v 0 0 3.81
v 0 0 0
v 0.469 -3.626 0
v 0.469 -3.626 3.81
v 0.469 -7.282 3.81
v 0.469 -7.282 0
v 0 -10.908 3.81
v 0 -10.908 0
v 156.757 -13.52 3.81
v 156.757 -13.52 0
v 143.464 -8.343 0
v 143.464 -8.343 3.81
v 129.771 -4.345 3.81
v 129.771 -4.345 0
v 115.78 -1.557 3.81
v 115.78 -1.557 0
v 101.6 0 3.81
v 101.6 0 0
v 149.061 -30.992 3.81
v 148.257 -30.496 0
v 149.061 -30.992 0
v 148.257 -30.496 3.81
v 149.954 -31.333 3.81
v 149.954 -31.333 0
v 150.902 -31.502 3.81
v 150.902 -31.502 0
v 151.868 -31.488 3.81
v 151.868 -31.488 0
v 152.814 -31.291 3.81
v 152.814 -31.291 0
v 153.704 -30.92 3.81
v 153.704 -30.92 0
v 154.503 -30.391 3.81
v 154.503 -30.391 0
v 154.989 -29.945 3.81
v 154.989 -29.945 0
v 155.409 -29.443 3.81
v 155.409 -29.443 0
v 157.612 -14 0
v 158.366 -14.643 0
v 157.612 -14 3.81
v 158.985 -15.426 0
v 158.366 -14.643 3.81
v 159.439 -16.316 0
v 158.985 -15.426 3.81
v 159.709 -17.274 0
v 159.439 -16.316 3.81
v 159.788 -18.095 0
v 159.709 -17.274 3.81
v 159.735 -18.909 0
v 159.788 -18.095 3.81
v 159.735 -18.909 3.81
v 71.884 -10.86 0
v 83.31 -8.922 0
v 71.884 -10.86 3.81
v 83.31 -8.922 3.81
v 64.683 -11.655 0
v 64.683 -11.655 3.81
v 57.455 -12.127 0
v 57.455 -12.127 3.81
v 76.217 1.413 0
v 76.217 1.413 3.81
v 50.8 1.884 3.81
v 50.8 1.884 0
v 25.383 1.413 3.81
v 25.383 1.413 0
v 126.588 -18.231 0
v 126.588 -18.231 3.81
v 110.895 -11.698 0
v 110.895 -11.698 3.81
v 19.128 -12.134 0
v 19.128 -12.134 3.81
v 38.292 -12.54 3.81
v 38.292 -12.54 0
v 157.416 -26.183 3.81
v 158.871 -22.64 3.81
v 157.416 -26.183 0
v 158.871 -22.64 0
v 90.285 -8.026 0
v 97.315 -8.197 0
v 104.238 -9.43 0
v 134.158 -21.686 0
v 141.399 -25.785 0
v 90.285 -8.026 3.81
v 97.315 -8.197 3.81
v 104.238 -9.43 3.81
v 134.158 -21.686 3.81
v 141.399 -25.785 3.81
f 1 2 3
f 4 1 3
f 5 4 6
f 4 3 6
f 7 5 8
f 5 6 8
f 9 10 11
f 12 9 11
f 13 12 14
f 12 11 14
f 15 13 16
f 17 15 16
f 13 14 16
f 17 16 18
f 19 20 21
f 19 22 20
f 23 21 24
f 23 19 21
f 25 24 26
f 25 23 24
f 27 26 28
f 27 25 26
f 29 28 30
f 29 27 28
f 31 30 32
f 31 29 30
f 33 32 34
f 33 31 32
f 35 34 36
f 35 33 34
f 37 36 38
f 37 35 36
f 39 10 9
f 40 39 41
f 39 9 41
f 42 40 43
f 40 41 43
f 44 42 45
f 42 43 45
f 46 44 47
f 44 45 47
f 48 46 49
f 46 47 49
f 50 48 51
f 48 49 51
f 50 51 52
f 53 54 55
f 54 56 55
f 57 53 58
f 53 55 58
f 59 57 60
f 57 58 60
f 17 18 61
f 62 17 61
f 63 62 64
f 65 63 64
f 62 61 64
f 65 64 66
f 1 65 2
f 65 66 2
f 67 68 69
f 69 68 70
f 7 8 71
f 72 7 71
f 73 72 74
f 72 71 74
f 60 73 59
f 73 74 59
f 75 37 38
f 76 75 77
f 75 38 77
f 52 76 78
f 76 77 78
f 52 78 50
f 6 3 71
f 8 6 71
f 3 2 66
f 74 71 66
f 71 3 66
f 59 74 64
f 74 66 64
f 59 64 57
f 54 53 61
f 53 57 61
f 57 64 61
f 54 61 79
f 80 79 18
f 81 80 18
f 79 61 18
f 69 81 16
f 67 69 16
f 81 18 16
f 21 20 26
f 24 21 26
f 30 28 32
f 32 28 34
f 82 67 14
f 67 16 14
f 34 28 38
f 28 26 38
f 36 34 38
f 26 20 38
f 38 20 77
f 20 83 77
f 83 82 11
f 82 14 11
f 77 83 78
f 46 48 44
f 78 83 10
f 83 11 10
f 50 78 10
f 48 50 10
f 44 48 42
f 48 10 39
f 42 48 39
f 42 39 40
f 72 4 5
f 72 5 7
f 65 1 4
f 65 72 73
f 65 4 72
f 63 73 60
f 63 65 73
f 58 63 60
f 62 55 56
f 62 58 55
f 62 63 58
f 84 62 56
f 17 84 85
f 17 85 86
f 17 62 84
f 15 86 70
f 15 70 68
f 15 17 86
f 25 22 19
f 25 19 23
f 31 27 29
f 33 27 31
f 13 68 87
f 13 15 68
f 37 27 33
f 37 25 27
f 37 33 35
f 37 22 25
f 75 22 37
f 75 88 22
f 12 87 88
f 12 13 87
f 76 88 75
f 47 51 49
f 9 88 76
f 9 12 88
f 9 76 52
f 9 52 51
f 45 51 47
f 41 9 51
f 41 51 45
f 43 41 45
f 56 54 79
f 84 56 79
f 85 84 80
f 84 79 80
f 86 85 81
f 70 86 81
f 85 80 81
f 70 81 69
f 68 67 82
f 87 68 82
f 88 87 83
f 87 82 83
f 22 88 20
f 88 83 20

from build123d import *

# Parameters (mm, degrees)
F1_DEPTH = 3.81
F2_R     = 5.08
F3_R     = 865.118216
F4_R     = 162.209665


with BuildPart() as f1:
    # F0 (on Top) → F1 (new body)
    with BuildSketch(Plane.XY):
        with BuildLine():
            ThreePointArc((159.982175, -14.983156), (131.487989, -4.776084), (101.6, 0))
            ThreePointArc((101.6, 0), (50.8, 1.883753), (0, 0))
            ThreePointArc((0, 0), (0.527793, -5.453793), (0, -10.907586))
            ThreePointArc((0, -10.907586), (38.216498, -12.540312), (76.432995, -10.907586))
            ThreePointArc((76.432995, -10.907586), (97.285986, -8.193881), (117.188677, -14.983156))
            ThreePointArc((117.188677, -14.983156), (135.458144, -22.361969), (151.831031, -33.323213))
            ThreePointArc((151.831031, -33.323213), (157.950398, -25.061539), (159.982175, -14.983156))
        make_face()
    extrude(amount=F1_DEPTH)

    # F2
    f2_edges = [f1.edges().sort_by_distance(p)[0] for p in [
        (151.831031, -33.323213, 1.905),
        (159.982175, -14.983156, 1.905),
    ]]
    fillet(f2_edges, radius=F2_R)

    # F3
    f3_edges = [f1.edges().sort_by_distance(p)[0] for p in [
        (117.188677, -14.983156, 1.905),
    ]]
    fillet(f3_edges, radius=F3_R)

    # F4
    f4_edges = [f1.edges().sort_by_distance(p)[0] for p in [
        (76.432995, -10.907586, 1.905),
    ]]
    fillet(f4_edges, radius=F4_R)


solid = f1.part
